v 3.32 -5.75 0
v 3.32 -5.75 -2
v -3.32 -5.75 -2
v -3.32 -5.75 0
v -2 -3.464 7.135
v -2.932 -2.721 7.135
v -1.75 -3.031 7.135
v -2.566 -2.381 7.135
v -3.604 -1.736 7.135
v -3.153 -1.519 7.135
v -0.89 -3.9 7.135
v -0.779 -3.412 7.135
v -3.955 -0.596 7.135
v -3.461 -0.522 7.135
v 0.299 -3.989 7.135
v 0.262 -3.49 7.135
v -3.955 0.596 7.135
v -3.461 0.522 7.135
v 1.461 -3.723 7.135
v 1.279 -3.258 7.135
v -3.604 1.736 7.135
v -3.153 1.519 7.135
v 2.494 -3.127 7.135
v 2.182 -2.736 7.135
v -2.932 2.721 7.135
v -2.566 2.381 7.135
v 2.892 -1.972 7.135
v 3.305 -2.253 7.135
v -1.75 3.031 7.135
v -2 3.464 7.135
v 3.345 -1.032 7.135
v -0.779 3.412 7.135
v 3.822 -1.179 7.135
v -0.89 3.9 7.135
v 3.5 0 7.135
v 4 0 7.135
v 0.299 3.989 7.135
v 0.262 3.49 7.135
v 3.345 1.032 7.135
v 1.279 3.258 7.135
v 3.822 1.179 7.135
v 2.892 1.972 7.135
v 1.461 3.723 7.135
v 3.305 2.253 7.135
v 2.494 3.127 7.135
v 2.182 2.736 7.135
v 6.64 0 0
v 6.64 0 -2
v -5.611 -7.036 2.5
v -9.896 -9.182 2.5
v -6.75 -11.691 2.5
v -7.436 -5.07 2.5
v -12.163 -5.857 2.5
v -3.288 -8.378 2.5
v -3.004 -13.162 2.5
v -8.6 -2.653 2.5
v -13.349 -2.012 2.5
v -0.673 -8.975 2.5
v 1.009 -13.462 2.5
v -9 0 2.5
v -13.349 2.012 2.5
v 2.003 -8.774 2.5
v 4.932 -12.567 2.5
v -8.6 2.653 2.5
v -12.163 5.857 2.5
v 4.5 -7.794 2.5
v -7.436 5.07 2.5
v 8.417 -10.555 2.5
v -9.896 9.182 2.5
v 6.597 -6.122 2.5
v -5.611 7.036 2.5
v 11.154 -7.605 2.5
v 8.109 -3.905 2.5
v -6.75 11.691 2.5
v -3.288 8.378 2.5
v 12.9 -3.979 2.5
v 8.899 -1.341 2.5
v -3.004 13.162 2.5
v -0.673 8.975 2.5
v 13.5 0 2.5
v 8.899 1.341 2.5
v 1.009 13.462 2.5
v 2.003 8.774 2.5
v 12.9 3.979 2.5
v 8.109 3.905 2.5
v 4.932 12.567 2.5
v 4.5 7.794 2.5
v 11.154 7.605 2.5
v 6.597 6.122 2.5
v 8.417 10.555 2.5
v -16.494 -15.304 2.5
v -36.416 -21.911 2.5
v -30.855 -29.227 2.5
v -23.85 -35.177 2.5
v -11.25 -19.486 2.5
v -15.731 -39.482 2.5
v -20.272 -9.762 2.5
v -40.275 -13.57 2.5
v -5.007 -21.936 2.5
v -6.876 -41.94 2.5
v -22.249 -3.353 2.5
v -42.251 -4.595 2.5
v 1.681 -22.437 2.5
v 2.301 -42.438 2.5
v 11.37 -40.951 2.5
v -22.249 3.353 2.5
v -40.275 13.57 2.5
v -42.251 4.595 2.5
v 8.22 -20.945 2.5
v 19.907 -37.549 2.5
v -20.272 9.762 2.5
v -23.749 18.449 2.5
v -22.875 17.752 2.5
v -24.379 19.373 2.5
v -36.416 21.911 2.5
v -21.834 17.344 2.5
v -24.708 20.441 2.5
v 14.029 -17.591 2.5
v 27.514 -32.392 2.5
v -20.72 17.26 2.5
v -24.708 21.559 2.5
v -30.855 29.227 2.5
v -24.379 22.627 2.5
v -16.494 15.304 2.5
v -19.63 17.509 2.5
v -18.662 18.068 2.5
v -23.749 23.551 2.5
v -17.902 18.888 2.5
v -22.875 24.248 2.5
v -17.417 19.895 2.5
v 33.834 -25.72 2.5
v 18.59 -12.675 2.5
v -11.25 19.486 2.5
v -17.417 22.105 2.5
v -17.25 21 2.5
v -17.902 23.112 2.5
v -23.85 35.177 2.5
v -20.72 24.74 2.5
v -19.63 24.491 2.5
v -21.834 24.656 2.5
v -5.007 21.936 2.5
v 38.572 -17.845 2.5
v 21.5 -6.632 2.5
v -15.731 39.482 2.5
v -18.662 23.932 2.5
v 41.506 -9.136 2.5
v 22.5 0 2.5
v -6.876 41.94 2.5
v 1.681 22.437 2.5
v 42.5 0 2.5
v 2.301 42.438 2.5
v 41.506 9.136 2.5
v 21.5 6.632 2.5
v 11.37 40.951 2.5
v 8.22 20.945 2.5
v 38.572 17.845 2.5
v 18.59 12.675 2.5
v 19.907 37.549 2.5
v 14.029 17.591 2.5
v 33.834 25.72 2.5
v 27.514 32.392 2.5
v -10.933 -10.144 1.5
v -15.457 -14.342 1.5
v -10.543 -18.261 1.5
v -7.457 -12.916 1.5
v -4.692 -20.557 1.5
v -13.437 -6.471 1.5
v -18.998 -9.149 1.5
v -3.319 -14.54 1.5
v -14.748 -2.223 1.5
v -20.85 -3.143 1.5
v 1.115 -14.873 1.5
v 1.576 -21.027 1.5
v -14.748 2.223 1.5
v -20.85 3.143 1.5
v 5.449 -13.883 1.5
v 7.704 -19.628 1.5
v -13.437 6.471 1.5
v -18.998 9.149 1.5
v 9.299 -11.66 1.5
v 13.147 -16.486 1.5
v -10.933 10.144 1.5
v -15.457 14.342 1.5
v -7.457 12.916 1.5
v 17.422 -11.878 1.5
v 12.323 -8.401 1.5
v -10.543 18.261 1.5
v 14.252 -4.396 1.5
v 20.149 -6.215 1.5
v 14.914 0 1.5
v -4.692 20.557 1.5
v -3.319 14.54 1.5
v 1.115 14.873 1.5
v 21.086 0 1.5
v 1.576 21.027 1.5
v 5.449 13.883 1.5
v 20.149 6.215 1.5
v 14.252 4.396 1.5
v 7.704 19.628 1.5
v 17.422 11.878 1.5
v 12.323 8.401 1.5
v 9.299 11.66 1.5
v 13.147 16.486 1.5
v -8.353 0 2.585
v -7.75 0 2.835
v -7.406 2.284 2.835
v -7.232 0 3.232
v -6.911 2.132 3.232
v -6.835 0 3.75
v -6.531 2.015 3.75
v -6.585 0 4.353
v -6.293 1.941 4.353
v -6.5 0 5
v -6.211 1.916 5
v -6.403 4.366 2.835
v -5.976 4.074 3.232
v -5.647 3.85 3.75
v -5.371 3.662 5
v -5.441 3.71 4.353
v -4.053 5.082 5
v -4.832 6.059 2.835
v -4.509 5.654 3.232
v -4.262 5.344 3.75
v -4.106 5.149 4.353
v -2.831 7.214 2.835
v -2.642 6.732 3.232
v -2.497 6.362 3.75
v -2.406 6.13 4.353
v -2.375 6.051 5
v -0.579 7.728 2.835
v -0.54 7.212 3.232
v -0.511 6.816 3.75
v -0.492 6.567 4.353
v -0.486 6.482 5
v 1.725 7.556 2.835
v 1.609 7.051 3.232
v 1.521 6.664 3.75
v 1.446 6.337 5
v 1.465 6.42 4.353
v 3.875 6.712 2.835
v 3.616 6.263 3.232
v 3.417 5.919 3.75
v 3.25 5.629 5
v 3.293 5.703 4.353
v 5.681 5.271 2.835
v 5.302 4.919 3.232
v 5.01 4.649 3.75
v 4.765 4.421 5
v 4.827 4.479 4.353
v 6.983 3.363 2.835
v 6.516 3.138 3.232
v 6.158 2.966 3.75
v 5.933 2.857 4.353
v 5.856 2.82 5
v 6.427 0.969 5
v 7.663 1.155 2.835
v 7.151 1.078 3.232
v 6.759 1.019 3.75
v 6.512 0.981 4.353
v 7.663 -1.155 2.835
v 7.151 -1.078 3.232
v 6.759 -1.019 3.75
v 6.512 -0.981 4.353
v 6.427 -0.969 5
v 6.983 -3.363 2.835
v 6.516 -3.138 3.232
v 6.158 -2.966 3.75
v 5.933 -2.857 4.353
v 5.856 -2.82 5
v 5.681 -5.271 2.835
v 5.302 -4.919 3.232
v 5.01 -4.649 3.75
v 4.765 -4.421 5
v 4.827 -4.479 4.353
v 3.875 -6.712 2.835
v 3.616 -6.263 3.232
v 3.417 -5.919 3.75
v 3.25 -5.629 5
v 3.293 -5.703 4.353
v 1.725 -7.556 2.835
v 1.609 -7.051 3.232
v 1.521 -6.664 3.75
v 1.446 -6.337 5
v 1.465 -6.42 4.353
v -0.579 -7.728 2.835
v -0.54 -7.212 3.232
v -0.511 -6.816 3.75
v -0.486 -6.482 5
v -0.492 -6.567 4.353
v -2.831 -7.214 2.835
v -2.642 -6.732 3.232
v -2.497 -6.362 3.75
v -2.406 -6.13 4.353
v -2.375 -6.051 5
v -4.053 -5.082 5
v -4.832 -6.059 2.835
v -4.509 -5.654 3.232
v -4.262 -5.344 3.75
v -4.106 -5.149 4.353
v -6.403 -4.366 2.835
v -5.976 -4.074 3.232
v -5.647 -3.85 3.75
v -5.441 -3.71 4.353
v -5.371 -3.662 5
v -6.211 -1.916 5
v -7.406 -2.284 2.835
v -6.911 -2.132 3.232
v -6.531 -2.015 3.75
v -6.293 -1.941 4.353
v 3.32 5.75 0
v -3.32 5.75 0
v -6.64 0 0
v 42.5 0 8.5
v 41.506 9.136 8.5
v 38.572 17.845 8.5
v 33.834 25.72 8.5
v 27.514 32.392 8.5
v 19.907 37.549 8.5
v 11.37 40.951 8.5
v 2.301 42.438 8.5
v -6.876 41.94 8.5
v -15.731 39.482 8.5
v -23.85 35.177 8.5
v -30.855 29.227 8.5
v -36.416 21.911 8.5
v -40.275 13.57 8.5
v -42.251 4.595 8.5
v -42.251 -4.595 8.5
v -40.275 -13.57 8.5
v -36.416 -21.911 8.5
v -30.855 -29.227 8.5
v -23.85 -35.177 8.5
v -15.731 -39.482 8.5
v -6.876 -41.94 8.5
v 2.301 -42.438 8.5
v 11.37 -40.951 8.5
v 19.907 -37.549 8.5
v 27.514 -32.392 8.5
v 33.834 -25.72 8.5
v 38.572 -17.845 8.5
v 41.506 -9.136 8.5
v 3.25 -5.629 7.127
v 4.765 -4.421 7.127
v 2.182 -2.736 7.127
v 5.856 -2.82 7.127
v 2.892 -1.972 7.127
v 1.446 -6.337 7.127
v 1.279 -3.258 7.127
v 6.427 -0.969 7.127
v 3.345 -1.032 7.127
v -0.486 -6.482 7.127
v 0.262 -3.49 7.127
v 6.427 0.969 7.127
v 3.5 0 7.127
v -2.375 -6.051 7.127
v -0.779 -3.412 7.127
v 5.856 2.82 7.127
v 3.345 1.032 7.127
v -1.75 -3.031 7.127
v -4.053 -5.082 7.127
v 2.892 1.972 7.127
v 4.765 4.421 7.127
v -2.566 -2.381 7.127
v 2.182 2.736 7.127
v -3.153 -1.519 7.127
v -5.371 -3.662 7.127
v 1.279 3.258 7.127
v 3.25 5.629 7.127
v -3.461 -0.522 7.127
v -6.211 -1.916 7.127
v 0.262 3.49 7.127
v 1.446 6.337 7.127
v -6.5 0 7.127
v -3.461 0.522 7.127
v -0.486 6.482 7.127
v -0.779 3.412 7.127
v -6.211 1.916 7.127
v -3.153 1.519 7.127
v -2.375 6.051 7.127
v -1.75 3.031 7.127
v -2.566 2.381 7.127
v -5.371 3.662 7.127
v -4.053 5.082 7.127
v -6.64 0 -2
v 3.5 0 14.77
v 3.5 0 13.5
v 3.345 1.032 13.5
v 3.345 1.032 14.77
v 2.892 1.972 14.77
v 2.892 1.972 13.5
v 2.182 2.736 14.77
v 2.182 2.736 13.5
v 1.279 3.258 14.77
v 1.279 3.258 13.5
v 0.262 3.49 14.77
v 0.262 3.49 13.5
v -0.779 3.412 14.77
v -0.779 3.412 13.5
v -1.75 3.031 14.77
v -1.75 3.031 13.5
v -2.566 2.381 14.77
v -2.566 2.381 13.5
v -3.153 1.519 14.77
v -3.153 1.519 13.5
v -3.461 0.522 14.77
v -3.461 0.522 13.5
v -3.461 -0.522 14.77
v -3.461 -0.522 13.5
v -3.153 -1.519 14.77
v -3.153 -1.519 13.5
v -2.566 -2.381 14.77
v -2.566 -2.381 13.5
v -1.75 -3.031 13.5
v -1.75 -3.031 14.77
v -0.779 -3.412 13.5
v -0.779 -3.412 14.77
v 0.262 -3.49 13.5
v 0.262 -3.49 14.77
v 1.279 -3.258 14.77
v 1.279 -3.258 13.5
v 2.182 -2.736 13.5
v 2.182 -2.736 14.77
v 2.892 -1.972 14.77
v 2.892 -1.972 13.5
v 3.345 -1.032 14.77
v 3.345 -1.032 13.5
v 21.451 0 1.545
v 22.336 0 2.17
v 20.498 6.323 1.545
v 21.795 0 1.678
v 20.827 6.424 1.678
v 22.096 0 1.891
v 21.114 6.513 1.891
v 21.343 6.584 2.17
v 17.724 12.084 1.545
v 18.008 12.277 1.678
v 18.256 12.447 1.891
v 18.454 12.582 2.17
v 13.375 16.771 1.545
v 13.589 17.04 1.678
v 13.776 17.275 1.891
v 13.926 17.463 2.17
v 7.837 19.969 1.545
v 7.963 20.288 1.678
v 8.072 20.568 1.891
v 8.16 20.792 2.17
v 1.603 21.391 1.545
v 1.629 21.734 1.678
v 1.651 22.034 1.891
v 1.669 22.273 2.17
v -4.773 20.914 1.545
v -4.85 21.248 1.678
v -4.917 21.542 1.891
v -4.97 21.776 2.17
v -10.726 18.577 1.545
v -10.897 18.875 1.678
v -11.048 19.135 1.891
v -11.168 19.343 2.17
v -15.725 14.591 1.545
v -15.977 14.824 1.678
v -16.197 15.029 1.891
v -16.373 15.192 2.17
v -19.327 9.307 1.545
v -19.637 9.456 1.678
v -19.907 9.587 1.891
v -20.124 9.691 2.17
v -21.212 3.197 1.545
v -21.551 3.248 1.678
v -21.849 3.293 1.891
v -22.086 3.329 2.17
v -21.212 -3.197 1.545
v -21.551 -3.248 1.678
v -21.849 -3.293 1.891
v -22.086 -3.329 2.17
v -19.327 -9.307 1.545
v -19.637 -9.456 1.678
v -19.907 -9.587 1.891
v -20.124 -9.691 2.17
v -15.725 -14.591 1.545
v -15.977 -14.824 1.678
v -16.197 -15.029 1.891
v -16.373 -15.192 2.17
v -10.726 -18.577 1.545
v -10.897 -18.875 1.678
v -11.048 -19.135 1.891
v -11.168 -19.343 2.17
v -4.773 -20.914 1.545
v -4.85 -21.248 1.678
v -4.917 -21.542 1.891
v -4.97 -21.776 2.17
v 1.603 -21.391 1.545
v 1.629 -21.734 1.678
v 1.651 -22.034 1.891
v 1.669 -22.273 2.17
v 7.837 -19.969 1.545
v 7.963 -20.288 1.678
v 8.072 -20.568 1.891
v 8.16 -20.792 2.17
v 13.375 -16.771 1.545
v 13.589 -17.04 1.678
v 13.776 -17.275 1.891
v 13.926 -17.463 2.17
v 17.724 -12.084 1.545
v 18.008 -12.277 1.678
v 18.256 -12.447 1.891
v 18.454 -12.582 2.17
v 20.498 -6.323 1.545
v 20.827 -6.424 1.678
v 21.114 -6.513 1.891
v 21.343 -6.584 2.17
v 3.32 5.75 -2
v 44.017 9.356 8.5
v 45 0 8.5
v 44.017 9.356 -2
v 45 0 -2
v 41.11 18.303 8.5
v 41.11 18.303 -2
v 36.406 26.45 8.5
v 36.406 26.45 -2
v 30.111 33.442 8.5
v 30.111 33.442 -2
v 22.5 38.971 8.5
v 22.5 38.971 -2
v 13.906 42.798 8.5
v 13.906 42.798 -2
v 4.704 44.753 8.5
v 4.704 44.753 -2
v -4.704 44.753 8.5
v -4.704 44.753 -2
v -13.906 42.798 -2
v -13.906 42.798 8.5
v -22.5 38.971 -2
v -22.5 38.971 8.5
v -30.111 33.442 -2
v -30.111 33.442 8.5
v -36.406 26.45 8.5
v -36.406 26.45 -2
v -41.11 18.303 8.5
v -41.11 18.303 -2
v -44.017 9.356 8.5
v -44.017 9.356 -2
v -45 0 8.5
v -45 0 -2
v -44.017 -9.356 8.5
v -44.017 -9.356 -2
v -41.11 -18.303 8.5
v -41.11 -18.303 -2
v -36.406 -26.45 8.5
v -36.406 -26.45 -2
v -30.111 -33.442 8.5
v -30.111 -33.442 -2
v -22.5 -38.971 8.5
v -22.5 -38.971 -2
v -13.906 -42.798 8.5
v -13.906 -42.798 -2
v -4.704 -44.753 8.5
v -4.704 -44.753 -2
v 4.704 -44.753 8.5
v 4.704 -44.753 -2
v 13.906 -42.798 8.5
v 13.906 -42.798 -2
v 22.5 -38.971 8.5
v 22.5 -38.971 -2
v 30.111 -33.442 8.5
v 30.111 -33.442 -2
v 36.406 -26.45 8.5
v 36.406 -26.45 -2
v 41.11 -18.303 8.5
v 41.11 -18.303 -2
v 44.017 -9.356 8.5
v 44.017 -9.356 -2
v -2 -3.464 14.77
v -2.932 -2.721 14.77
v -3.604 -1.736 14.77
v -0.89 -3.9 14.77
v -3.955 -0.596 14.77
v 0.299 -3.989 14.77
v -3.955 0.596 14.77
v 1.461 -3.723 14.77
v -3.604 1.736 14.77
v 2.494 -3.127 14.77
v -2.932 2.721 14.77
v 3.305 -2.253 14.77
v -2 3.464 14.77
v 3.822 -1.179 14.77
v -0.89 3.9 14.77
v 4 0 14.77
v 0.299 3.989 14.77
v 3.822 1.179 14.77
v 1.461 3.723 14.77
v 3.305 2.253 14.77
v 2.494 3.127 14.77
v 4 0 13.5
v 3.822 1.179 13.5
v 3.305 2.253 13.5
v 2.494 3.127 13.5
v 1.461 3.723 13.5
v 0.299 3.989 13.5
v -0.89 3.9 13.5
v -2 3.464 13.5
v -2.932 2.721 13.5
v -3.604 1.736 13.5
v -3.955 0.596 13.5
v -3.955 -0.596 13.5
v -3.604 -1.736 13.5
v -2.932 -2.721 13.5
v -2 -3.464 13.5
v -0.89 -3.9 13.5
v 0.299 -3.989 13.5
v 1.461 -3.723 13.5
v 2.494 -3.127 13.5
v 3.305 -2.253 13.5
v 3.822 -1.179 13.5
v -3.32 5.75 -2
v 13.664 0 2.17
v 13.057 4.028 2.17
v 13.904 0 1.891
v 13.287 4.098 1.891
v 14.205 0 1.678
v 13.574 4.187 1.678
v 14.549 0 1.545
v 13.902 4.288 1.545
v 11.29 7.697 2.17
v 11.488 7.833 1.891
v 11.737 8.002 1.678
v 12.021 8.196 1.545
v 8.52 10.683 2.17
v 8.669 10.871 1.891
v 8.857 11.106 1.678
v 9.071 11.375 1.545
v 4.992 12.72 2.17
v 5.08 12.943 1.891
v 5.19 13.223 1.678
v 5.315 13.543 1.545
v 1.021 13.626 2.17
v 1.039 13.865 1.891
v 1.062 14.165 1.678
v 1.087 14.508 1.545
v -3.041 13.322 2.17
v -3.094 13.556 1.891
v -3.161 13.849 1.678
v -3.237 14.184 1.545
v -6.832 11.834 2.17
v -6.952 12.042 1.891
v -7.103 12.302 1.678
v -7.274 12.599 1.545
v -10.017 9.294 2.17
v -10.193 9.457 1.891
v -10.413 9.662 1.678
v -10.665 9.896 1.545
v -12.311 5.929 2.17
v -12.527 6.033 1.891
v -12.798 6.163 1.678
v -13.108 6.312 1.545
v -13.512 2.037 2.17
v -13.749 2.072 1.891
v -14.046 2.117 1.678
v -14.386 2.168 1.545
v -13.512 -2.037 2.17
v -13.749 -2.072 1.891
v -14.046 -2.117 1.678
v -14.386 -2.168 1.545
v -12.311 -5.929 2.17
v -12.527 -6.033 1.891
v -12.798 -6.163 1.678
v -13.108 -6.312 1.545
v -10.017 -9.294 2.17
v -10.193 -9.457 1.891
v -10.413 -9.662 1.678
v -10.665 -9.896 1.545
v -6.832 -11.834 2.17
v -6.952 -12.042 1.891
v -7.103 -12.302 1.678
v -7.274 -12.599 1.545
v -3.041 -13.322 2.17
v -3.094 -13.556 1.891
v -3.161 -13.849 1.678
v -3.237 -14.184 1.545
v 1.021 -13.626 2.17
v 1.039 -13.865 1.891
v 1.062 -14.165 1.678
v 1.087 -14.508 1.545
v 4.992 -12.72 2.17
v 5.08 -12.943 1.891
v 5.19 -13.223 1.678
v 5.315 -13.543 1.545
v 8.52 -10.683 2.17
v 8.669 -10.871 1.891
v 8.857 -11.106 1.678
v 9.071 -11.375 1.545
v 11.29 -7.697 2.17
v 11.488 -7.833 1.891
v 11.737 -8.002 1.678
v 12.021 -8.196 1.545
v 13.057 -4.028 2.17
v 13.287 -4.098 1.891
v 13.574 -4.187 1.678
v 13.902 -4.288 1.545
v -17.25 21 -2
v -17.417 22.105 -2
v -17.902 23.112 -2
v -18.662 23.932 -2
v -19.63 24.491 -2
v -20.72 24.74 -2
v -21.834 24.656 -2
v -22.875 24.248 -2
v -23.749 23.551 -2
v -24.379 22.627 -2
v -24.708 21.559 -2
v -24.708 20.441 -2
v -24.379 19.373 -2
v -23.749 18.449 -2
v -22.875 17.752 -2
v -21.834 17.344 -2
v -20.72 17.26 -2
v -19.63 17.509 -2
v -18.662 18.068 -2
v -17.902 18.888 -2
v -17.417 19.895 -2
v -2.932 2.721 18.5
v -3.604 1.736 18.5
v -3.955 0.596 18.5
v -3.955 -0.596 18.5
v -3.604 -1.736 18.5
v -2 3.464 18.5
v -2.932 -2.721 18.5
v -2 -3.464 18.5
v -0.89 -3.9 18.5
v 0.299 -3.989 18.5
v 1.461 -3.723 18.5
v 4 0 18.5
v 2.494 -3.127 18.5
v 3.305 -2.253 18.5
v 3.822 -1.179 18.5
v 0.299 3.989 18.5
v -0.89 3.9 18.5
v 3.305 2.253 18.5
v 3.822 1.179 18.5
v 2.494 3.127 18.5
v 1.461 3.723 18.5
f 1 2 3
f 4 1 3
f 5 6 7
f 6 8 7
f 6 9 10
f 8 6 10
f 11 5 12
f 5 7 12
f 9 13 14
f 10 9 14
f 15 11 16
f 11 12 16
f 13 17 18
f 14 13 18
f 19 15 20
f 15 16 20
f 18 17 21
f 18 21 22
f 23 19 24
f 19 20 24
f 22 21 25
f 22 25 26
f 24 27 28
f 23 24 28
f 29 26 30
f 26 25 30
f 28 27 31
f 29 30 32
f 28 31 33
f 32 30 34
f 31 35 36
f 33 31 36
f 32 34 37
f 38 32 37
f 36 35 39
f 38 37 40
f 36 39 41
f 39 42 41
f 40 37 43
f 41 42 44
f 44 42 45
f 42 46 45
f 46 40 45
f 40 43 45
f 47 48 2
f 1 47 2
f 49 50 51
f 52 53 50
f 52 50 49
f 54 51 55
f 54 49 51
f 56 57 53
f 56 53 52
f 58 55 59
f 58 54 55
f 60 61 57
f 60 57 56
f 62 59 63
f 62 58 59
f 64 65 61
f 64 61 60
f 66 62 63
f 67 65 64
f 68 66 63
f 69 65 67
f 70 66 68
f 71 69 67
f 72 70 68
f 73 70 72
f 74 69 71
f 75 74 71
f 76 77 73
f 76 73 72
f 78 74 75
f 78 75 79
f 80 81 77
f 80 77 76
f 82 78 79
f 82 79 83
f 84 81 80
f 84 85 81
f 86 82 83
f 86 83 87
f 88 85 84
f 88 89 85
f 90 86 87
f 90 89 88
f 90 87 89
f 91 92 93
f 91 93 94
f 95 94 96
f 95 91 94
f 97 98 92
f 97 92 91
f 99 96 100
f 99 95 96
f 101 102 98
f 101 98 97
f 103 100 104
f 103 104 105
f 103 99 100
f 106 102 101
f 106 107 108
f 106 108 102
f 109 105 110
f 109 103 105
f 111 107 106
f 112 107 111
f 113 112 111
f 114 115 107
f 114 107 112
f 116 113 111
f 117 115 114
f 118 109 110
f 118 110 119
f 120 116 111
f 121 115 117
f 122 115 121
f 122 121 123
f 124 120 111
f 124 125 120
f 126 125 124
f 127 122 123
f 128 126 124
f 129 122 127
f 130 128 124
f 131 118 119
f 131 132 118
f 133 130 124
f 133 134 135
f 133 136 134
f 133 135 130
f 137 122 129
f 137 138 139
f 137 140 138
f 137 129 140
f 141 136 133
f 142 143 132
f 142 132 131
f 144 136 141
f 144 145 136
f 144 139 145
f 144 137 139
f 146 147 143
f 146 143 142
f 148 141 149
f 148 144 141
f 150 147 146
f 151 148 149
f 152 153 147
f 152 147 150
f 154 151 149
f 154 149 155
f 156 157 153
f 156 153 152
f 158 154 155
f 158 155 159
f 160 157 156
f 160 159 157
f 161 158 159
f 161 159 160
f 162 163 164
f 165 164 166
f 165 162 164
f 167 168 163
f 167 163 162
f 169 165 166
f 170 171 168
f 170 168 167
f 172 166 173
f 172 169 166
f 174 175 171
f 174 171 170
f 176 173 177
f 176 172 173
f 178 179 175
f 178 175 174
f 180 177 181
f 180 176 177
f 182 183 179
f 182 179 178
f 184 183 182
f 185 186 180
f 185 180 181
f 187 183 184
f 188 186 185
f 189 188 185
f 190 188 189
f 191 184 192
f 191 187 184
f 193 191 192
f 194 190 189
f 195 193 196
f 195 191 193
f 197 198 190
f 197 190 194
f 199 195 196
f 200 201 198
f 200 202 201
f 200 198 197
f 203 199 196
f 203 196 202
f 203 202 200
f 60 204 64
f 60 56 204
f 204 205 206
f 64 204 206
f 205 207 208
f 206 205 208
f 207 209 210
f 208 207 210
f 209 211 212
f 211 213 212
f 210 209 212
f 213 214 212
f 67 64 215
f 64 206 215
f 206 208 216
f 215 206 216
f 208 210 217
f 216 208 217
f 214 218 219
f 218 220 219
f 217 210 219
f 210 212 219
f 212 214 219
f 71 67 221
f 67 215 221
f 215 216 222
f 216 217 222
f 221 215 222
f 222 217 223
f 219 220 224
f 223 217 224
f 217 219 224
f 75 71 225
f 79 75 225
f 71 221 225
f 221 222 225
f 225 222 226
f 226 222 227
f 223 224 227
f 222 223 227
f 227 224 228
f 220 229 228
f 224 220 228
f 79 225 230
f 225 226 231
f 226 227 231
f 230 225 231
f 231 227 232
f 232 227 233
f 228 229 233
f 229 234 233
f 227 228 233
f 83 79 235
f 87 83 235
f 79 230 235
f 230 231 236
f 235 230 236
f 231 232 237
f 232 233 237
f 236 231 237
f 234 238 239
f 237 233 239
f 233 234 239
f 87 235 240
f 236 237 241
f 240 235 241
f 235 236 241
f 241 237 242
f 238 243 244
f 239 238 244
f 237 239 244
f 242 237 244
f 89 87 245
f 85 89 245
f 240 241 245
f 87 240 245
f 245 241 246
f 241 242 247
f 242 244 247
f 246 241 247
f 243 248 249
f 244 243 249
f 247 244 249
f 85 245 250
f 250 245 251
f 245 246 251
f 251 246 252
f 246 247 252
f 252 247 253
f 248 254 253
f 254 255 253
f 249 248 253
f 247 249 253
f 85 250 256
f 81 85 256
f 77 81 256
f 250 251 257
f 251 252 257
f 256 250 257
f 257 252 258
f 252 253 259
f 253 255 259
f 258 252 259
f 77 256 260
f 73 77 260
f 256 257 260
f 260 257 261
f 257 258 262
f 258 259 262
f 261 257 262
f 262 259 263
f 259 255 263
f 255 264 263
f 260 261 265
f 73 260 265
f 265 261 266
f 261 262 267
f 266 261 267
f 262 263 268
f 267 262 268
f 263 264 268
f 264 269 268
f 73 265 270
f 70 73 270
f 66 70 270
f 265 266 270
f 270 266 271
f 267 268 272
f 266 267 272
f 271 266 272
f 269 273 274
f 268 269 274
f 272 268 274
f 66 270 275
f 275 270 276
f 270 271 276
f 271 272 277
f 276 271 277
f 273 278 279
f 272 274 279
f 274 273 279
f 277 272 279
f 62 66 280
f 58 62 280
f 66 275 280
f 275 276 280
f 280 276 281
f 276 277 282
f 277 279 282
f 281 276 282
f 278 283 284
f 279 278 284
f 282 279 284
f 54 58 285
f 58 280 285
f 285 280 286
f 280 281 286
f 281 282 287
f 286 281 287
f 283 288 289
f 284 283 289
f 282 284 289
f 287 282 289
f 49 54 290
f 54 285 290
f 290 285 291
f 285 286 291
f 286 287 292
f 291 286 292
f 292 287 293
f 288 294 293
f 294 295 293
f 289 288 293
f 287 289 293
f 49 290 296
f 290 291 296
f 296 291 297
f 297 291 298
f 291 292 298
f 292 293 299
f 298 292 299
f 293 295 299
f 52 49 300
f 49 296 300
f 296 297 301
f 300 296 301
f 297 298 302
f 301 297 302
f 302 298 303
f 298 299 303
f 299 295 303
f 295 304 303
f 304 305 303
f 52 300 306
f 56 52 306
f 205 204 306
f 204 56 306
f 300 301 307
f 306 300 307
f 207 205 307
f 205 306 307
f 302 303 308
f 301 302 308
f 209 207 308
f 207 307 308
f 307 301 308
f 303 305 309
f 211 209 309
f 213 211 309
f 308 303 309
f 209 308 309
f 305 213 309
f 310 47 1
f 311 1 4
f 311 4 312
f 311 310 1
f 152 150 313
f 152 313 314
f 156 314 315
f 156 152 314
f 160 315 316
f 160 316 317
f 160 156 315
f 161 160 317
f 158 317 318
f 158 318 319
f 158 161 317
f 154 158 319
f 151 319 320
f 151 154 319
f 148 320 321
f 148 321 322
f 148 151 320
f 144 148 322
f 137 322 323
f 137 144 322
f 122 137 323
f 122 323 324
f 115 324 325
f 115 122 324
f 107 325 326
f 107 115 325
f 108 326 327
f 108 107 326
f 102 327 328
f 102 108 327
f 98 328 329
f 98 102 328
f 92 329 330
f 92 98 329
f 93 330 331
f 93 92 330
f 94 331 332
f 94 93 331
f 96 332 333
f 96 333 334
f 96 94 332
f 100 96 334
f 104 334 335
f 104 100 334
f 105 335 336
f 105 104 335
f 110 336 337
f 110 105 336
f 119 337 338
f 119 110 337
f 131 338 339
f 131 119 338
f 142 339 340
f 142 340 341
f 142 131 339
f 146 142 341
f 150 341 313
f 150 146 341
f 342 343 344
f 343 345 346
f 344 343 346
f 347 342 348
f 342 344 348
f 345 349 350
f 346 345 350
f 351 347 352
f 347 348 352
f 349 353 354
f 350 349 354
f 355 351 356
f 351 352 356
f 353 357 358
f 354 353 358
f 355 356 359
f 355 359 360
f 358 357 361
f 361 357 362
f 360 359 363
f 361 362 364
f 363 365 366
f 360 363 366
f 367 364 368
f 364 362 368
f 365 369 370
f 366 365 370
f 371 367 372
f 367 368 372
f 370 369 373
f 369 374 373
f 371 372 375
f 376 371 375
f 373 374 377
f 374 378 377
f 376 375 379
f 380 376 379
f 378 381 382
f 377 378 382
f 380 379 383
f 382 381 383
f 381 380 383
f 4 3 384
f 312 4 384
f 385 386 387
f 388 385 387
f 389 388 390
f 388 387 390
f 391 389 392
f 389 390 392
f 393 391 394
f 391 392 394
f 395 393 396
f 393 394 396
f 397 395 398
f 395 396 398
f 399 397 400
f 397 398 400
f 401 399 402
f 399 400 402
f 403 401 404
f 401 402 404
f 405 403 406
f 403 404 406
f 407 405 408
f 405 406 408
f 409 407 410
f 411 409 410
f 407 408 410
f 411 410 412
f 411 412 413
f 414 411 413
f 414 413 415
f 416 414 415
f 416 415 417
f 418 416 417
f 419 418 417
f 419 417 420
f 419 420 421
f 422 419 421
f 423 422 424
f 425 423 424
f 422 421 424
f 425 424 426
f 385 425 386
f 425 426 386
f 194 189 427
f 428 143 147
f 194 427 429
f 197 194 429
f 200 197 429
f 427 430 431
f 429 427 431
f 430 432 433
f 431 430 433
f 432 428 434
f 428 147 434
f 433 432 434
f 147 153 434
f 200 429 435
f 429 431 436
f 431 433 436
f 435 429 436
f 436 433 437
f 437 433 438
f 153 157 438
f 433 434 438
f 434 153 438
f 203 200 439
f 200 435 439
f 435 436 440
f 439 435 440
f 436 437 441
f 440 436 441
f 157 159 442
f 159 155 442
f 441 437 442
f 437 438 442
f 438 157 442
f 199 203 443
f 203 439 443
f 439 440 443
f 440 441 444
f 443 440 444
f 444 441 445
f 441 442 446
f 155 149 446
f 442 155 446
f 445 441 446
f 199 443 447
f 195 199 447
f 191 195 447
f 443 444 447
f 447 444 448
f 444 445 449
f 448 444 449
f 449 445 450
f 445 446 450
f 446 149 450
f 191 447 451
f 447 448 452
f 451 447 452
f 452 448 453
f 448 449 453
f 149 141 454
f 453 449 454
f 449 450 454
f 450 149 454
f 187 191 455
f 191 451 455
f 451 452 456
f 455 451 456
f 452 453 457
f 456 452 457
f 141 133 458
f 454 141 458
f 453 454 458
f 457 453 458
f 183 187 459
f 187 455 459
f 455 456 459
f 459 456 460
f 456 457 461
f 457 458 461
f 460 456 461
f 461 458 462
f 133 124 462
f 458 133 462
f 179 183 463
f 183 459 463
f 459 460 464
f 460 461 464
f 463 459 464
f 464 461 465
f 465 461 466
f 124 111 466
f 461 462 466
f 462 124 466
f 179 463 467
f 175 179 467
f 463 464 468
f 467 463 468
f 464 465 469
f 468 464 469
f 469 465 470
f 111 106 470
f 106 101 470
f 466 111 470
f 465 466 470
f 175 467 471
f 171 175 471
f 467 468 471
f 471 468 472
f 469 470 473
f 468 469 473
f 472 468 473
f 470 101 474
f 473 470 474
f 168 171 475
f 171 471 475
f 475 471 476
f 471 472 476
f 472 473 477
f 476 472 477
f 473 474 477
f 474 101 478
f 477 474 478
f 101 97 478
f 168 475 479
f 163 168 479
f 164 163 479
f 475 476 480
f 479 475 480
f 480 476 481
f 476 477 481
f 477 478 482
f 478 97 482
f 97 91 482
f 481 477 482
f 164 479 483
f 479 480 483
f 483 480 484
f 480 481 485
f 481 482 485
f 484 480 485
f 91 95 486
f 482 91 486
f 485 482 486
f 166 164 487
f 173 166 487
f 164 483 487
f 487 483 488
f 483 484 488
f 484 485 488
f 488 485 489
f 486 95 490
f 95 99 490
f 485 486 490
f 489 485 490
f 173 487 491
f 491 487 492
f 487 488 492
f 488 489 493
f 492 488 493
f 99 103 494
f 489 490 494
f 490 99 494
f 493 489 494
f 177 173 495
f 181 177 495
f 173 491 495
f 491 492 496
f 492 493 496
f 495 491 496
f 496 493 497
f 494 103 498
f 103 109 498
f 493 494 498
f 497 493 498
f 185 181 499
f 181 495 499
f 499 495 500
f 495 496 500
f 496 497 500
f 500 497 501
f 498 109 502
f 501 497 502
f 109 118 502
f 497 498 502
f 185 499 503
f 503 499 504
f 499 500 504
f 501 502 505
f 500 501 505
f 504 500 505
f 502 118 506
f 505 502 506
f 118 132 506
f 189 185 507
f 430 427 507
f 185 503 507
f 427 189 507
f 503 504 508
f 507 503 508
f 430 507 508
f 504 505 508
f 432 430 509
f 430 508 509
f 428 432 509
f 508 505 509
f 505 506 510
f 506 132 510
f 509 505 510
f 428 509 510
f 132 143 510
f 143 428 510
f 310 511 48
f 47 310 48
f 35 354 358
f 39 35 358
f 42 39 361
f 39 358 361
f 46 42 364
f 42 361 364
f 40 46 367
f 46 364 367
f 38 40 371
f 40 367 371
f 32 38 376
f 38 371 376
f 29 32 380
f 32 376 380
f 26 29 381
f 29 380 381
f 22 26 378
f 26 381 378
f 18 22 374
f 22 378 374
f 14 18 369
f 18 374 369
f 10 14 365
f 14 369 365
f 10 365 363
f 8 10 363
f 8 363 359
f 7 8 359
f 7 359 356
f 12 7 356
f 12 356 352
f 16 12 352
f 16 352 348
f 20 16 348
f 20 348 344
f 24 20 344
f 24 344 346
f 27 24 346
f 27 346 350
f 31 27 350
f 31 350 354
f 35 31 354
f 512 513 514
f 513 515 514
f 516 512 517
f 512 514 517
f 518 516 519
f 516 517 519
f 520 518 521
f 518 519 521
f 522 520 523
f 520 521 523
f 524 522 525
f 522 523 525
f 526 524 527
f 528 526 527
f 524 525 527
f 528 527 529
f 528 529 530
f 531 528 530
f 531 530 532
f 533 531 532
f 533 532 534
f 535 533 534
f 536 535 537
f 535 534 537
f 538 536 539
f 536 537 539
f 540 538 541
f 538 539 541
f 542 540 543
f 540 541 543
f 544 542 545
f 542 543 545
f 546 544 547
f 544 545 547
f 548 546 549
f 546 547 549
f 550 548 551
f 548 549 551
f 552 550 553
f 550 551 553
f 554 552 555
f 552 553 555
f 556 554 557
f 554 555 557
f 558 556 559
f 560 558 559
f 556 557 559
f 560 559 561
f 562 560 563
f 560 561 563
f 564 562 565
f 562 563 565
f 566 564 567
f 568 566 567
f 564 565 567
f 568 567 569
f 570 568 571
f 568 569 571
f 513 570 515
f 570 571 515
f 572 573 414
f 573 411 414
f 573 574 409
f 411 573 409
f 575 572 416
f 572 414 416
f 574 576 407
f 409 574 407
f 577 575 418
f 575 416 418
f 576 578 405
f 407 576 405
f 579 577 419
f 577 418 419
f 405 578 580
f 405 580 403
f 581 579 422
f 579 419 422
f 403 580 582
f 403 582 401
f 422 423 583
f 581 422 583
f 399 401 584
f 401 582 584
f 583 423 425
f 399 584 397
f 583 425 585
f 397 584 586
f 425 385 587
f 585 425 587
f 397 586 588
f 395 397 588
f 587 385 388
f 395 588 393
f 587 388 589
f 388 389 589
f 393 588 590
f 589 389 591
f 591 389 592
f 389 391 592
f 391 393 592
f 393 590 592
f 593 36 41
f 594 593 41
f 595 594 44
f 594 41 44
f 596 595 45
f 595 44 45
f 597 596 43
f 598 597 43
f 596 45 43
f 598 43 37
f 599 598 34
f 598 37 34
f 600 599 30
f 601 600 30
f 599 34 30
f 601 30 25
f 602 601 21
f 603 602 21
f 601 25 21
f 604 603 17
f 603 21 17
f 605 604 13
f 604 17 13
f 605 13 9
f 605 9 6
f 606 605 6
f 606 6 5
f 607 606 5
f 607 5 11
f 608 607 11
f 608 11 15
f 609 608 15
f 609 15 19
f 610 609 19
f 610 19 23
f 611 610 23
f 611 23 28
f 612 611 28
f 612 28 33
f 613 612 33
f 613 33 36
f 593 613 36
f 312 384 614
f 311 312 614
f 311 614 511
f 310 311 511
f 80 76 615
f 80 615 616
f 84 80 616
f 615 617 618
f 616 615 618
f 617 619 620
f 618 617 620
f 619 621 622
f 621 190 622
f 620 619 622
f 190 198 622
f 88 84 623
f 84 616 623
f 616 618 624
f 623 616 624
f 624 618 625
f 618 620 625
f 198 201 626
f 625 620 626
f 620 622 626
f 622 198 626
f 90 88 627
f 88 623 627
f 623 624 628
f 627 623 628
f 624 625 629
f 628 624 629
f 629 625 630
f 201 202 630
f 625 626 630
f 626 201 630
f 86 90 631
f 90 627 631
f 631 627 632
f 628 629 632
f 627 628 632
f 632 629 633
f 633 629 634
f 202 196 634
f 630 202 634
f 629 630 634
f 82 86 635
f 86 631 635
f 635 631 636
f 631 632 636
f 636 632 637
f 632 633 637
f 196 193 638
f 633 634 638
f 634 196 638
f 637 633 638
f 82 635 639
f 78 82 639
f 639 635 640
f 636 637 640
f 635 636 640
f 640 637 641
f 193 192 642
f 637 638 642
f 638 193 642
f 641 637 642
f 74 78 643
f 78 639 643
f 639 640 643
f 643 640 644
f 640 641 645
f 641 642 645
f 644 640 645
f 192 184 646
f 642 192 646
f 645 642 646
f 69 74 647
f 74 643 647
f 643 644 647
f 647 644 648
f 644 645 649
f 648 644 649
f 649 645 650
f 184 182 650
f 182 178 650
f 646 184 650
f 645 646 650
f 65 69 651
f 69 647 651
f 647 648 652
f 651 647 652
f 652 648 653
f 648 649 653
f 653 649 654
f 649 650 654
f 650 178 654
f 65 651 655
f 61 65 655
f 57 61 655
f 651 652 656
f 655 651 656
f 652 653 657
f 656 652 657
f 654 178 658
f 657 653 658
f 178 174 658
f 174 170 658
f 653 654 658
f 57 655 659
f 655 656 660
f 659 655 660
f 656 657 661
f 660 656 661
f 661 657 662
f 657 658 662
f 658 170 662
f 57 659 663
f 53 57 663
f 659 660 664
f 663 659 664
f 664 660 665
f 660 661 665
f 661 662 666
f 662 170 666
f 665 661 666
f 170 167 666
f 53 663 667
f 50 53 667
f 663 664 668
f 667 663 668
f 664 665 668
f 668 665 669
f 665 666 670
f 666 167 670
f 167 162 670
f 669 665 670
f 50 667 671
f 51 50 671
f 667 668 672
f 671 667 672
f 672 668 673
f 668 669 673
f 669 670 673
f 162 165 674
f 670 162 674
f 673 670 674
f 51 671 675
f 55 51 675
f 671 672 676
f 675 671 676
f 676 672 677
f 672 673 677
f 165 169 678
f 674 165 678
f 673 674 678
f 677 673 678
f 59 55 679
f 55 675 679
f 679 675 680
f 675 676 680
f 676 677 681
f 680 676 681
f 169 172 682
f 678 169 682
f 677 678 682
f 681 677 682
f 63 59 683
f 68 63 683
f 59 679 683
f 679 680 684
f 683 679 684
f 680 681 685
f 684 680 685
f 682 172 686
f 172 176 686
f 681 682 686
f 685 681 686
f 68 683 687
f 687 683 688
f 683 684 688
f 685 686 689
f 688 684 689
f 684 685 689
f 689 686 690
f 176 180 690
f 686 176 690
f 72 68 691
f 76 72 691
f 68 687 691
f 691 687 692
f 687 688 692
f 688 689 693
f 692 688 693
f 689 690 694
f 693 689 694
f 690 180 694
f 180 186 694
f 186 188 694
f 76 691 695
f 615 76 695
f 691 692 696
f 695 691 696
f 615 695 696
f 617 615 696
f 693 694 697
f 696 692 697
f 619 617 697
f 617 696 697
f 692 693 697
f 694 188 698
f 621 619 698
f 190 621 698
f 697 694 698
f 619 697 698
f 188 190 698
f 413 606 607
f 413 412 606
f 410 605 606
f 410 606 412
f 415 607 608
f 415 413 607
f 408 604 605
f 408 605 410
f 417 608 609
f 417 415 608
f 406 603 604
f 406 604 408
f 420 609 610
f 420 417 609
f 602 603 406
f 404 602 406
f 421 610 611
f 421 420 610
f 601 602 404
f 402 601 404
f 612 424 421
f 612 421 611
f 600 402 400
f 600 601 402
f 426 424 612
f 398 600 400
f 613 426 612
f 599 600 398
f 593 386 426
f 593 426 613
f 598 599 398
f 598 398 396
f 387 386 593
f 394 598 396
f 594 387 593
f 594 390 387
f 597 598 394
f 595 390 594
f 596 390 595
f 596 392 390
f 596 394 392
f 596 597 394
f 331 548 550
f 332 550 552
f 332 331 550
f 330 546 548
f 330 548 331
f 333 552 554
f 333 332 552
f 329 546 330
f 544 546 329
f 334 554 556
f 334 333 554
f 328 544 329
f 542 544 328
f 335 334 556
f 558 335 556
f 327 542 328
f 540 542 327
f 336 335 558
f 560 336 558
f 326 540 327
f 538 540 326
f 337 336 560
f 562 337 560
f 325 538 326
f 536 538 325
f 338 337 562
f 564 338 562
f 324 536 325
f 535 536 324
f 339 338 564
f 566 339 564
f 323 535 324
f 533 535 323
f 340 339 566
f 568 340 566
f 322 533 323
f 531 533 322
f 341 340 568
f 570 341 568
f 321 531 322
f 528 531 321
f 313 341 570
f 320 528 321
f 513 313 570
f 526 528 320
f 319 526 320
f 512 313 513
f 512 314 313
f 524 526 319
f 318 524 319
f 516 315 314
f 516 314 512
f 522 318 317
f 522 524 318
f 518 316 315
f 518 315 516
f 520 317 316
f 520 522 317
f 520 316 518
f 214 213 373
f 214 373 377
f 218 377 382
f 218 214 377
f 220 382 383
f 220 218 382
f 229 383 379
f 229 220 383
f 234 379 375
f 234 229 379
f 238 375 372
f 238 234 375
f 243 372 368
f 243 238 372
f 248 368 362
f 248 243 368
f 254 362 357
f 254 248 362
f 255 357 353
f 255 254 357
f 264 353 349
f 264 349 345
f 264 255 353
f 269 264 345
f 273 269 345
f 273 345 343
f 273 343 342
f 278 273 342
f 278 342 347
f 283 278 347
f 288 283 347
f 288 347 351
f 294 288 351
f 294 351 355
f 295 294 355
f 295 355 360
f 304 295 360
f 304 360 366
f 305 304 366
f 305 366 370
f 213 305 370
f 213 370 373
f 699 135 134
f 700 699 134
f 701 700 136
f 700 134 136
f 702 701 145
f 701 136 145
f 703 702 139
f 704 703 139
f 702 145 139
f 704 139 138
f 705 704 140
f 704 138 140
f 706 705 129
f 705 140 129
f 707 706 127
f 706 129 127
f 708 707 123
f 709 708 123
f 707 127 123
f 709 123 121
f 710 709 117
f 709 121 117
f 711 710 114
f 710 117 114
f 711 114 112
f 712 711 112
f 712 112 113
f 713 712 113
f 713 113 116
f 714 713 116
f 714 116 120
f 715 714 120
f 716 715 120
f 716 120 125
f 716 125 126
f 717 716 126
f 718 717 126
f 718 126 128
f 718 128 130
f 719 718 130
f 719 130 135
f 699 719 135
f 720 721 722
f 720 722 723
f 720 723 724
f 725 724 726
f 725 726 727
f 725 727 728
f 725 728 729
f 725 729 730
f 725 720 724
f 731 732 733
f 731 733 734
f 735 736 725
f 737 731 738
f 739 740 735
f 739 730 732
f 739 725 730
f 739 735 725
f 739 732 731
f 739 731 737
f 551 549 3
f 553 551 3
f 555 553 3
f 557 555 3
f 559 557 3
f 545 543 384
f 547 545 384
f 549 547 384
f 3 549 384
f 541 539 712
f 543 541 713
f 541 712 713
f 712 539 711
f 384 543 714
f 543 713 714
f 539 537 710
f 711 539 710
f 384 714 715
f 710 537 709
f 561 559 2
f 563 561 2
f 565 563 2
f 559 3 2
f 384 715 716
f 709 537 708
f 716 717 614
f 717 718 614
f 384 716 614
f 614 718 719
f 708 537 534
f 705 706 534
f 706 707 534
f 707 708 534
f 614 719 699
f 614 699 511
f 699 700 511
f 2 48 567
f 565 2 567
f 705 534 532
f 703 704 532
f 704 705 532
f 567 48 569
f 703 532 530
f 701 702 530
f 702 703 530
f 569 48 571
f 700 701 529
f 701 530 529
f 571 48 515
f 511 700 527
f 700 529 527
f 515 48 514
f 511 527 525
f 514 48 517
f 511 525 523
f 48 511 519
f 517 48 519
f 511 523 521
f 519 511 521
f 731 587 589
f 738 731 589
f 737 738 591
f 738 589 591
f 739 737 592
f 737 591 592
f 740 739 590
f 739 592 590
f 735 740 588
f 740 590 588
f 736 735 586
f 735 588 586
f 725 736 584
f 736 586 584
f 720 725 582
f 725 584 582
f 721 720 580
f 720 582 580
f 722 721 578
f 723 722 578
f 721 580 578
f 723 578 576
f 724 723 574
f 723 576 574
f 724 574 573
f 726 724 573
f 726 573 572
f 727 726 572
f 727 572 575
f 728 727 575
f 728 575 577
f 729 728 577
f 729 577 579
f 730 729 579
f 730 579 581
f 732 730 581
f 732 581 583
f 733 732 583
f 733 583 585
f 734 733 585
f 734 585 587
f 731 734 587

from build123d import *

# Parameters (mm, degrees)
BOSS_EXTRUDE1_DEPTH      = 2.5
BOSS_EXTRUDE1_DEPTH_BACK = 2
SKETCH1_R                = 45
SKETCH2_R                = 45
SKETCH2_R_2              = 42.5
BOSS_EXTRUDE2_DEPTH      = 6
SKETCH3_R                = 4
BOSS_EXTRUDE3_DEPTH      = 16
SKETCH4_R                = 4
SKETCH4_R_2              = 3.5
CUT_EXTRUDE1_DEPTH       = 1.27
CUT_EXTRUDE2_START       = -1.27
SKETCH5_R                = 4
SKETCH5_R_2              = 3.5
CUT_EXTRUDE2_DEPTH       = 1.27
CUT_EXTRUDE3_DEPTH       = 2
SKETCH7_R                = 3.75
CUT_EXTRUDE4_DEPTH       = 66.620118866
SKETCH8_R                = 22.5
SKETCH8_R_2              = 13.5
CUT_EXTRUDE5_DEPTH       = 1
FILLET2_R                = 1.5
SKETCH11_R               = 6.5
BOSS_EXTRUDE4_DEPTH      = 7.127
FILLET3_R                = 2.5


with BuildPart() as part:
    # Sketch1 → Boss-Extrude1 (new, two sides: drawn at the far end of the back side and taken through both)
    with BuildSketch(Plane.XY.offset(-BOSS_EXTRUDE1_DEPTH_BACK)):
        Circle(SKETCH1_R)
    extrude(amount=BOSS_EXTRUDE1_DEPTH + BOSS_EXTRUDE1_DEPTH_BACK)

    # Sketch2 → Boss-Extrude2 (add)
    with BuildSketch(Plane.XY.offset(2.5)):
        Circle(SKETCH2_R)
        Circle(SKETCH2_R_2, mode=Mode.SUBTRACT)
    extrude(amount=BOSS_EXTRUDE2_DEPTH)

    # Sketch3 → Boss-Extrude3 (add)
    with BuildSketch(Plane.XY.offset(2.5)):
        Circle(SKETCH3_R)
    extrude(amount=BOSS_EXTRUDE3_DEPTH)

    # Sketch4 → Cut-Extrude1 (cut)
    with BuildSketch(Plane.XY.offset(13.5)):
        Circle(SKETCH4_R)
        Circle(SKETCH4_R_2, mode=Mode.SUBTRACT)
    extrude(amount=CUT_EXTRUDE1_DEPTH, mode=Mode.SUBTRACT)

    # Sketch5 → Cut-Extrude2 (cut)
    with BuildSketch(Plane.XY.offset(7.135).offset(CUT_EXTRUDE2_START)):
        Circle(SKETCH5_R)
        Circle(SKETCH5_R_2, mode=Mode.SUBTRACT)
    extrude(amount=CUT_EXTRUDE2_DEPTH, mode=Mode.SUBTRACT)

    # Sketch6 → Cut-Extrude3 (cut)
    with BuildSketch(Plane(origin=(0, 0, -2), x_dir=(-1, 0, 0), z_dir=(0, 0, -1))):
        Polygon((-6.639528096, 0), (-3.319764048, -5.75), (3.319764048, -5.75), (6.639528096, 0), (3.319764048, 5.75), (-3.319764048, 5.75), align=None)
    extrude(amount=-CUT_EXTRUDE3_DEPTH, mode=Mode.SUBTRACT)

    # Sketch7 → Cut-Extrude4 (cut, through all)
    with BuildSketch(Plane.XY.offset(2.5)):
        with Locations((-21, 21)):
            Circle(SKETCH7_R)
    extrude(amount=-CUT_EXTRUDE4_DEPTH, mode=Mode.SUBTRACT)

    # Sketch8 → Cut-Extrude5 (cut)
    with BuildSketch(Plane.XY.offset(2.5)):
        Circle(SKETCH8_R)
        Circle(SKETCH8_R_2, mode=Mode.SUBTRACT)
    extrude(amount=-CUT_EXTRUDE5_DEPTH, mode=Mode.SUBTRACT)

    # Fillet2
    # the kernel refuses this fillet: 1.5 mm, written as the material it adds along each edge
    with BuildSketch(Plane(origin=(0, 0, 1.5), x_dir=(1, 0, 0), z_dir=(0, -1, 0))) as fillet2_piece_1:
        with BuildLine():
            CenterArc((21.085786438, 1.5), FILLET2_R, 270, 70.528779366)
            Line((21.085786438, 0), (21.085786438, -0.03))
            Line((21.085786438, -0.03), (22.5, -0.03))
            Line((22.5, -0.03), (22.53, 0))
            ThreePointArc((22.53, 0), (22.53, 0.5), (22.528284271, 0.99))
            Line((22.528284271, 0.99), (22.5, 1))
        make_face()
    revolve(axis=Axis((0, 0, 1.5), (0, 0, 1)))
    with BuildSketch(Plane(origin=(0, 0, 1.5), x_dir=(1, 0, 0), z_dir=(0, -1, 0))) as fillet2_piece_2:
        with BuildLine():
            CenterArc((14.914213562, 1.5), FILLET2_R, 199.471220634, 70.528779366)
            Line((13.5, 1), (13.471715729, 0.99))
            ThreePointArc((13.471715729, 0.99), (13.47, 0.5), (13.47, 0))
            Line((13.47, 0), (13.5, -0.03))
            Line((13.5, -0.03), (14.914213562, -0.03))
            Line((14.914213562, -0.03), (14.914213562, 0))
        make_face()
    revolve(axis=Axis((0, 0, 1.5), (0, 0, 1)))

    # Sketch11 → Boss-Extrude4 (add)
    with BuildSketch(Plane(origin=(0, 0, 0), x_dir=(-1, 0, 0), z_dir=(0, 0, -1))):
        Circle(SKETCH11_R)
    extrude(amount=-BOSS_EXTRUDE4_DEPTH)

    # Fillet3
    fillet3_edges = [part.edges().sort_by_distance(p)[0] for p in [
        (6.5, 0, 2.5),
    ]]
    fillet(fillet3_edges, radius=FILLET3_R)


solid = part.part
